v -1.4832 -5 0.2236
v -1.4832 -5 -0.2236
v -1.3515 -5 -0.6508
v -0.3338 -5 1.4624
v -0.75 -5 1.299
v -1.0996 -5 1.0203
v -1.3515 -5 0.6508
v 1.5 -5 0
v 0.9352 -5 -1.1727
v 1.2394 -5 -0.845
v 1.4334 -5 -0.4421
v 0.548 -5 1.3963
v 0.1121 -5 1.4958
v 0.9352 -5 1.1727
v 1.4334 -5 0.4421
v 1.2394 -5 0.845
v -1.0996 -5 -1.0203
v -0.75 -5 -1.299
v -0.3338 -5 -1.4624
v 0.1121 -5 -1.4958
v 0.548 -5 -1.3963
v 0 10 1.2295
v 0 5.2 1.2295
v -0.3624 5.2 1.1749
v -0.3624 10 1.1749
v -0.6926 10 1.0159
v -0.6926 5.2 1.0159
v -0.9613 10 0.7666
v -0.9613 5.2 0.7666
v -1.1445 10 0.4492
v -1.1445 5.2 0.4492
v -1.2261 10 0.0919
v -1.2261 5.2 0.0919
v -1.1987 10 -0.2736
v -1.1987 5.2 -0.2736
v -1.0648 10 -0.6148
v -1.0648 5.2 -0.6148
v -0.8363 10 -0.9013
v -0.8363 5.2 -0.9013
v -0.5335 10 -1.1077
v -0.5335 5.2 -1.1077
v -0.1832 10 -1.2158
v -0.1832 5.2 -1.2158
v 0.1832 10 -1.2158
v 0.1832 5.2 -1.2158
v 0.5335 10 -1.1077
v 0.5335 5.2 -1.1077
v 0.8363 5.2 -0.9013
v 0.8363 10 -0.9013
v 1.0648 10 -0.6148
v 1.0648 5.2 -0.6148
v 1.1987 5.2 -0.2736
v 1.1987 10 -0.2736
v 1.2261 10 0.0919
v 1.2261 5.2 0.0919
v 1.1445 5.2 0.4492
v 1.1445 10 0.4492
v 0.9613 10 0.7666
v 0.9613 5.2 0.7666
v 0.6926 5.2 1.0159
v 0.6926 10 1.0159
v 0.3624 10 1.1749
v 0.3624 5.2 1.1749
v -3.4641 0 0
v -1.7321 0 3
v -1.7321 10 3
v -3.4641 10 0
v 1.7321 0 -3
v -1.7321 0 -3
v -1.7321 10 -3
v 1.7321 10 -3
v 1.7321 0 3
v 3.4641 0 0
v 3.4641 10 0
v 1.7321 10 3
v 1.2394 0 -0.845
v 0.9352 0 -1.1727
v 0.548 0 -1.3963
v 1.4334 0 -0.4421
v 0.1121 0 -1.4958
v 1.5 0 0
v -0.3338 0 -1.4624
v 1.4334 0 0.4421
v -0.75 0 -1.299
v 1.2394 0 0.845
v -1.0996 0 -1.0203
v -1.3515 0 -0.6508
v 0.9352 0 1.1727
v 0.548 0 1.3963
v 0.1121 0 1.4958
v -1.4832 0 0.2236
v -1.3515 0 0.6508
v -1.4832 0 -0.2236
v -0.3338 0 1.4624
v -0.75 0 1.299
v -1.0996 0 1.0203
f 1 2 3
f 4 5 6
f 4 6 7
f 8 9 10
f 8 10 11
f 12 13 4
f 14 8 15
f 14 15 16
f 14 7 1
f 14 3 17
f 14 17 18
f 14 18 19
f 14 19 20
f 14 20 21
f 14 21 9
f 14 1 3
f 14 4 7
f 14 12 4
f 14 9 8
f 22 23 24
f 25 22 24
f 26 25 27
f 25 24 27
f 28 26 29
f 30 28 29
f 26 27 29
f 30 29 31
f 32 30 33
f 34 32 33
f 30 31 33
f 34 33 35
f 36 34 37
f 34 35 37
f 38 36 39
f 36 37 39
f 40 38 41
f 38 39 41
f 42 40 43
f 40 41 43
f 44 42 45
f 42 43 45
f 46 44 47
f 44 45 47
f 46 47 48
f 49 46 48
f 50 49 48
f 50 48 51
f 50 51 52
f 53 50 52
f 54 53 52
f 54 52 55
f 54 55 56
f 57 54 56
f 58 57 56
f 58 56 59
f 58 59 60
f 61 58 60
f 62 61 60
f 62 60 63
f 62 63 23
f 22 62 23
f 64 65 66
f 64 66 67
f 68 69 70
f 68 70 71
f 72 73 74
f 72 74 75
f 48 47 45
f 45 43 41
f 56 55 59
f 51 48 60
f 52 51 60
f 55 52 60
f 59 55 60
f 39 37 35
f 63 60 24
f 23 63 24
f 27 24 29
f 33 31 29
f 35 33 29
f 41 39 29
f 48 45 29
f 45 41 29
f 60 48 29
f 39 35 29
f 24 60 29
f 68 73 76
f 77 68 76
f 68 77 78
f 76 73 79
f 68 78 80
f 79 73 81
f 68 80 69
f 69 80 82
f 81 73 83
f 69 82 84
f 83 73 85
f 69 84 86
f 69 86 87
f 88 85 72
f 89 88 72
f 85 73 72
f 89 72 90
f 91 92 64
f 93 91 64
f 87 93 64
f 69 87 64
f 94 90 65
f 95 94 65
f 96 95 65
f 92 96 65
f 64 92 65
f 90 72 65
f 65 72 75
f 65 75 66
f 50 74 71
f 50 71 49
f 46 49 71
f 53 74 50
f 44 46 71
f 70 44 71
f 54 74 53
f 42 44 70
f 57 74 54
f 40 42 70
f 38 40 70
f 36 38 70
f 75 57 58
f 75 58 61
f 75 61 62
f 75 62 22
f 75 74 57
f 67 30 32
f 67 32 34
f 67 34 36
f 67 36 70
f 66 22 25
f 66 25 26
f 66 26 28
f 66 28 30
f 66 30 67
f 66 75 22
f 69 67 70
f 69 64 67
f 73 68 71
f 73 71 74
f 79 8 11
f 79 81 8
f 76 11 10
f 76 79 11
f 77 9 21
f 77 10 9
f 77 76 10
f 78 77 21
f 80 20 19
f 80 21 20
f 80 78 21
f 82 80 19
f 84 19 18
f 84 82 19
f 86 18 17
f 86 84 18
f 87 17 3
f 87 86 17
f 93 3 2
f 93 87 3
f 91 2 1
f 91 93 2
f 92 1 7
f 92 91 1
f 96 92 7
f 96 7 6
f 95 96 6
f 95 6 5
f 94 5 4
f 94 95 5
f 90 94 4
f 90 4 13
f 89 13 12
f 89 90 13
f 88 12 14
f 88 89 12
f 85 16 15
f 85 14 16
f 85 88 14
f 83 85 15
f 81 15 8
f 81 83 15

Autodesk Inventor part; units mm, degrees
ref_plane "YZ Plane" through (0, 0, 0) normal (1, 0, 0) x (0, 1, 0)
ref_plane "XZ Plane" through (0, 0, 0) normal (0, 1, 0) x (-1, 0, 0)
ref_plane "XY Plane" through (0, 0, 0) normal (0, 0, 1) x (1, 0, 0)
sketch "スケッチ1" plane through (0, 0, 0) normal (0, 1, 0) x (-1, 0, 0)
  line L0 (1.7321, -3) -> (-1.7321, -3)
  line L1 (-1.7321, -3) -> (-3.4641, 0)
  line L2 (-3.4641, 0) -> (-1.7321, 3)
  line L3 (-1.7321, 3) -> (1.7321, 3)
  line L4 (1.7321, 3) -> (3.4641, 0)
  line L5 (3.4641, 0) -> (1.7321, -3)
  line L6 (1.7321, -3) -> (-1.7321, 3) construction
  line L7 (-3.4641, 0) -> (3.4641, 0) construction
  line L8 (-1.7321, -3) -> (1.7321, 3) construction
  point P0 (0, 0)
  point P1 (0, 0)
  point P2 (0, 0)
  dimension "d0" = 6
extrude "押し出し1" add sketch "スケッチ1" along normal blind 10
sketch "スケッチ2" plane through (0, 10, 0) normal (0, 1, 0) x (1, 0, 0)
  point P0 (0, 0)
  point P1 (0, 0)
hole "穴1" at (0, 10, 0) direction (0, -1, 0) diameter 2.459 depth 4.8 thread size "M3x0.5" class "6H" standard "ISO Metric profile"
sketch "スケッチ3" plane through (0, 0, 0) normal (0, -1, 0) x (1, 0, 0)
  circle A0 centre (0, 0) radius 1.5
  dimension "d10" = 3
extrude "押し出し2" add sketch "スケッチ3" along normal blind 5
thread "ねじ1" size "M3x0.5" class "6g" standard "ISO Metric profile" full length
properties part number "Spacer10mm" material "アセタール樹脂、黒"
